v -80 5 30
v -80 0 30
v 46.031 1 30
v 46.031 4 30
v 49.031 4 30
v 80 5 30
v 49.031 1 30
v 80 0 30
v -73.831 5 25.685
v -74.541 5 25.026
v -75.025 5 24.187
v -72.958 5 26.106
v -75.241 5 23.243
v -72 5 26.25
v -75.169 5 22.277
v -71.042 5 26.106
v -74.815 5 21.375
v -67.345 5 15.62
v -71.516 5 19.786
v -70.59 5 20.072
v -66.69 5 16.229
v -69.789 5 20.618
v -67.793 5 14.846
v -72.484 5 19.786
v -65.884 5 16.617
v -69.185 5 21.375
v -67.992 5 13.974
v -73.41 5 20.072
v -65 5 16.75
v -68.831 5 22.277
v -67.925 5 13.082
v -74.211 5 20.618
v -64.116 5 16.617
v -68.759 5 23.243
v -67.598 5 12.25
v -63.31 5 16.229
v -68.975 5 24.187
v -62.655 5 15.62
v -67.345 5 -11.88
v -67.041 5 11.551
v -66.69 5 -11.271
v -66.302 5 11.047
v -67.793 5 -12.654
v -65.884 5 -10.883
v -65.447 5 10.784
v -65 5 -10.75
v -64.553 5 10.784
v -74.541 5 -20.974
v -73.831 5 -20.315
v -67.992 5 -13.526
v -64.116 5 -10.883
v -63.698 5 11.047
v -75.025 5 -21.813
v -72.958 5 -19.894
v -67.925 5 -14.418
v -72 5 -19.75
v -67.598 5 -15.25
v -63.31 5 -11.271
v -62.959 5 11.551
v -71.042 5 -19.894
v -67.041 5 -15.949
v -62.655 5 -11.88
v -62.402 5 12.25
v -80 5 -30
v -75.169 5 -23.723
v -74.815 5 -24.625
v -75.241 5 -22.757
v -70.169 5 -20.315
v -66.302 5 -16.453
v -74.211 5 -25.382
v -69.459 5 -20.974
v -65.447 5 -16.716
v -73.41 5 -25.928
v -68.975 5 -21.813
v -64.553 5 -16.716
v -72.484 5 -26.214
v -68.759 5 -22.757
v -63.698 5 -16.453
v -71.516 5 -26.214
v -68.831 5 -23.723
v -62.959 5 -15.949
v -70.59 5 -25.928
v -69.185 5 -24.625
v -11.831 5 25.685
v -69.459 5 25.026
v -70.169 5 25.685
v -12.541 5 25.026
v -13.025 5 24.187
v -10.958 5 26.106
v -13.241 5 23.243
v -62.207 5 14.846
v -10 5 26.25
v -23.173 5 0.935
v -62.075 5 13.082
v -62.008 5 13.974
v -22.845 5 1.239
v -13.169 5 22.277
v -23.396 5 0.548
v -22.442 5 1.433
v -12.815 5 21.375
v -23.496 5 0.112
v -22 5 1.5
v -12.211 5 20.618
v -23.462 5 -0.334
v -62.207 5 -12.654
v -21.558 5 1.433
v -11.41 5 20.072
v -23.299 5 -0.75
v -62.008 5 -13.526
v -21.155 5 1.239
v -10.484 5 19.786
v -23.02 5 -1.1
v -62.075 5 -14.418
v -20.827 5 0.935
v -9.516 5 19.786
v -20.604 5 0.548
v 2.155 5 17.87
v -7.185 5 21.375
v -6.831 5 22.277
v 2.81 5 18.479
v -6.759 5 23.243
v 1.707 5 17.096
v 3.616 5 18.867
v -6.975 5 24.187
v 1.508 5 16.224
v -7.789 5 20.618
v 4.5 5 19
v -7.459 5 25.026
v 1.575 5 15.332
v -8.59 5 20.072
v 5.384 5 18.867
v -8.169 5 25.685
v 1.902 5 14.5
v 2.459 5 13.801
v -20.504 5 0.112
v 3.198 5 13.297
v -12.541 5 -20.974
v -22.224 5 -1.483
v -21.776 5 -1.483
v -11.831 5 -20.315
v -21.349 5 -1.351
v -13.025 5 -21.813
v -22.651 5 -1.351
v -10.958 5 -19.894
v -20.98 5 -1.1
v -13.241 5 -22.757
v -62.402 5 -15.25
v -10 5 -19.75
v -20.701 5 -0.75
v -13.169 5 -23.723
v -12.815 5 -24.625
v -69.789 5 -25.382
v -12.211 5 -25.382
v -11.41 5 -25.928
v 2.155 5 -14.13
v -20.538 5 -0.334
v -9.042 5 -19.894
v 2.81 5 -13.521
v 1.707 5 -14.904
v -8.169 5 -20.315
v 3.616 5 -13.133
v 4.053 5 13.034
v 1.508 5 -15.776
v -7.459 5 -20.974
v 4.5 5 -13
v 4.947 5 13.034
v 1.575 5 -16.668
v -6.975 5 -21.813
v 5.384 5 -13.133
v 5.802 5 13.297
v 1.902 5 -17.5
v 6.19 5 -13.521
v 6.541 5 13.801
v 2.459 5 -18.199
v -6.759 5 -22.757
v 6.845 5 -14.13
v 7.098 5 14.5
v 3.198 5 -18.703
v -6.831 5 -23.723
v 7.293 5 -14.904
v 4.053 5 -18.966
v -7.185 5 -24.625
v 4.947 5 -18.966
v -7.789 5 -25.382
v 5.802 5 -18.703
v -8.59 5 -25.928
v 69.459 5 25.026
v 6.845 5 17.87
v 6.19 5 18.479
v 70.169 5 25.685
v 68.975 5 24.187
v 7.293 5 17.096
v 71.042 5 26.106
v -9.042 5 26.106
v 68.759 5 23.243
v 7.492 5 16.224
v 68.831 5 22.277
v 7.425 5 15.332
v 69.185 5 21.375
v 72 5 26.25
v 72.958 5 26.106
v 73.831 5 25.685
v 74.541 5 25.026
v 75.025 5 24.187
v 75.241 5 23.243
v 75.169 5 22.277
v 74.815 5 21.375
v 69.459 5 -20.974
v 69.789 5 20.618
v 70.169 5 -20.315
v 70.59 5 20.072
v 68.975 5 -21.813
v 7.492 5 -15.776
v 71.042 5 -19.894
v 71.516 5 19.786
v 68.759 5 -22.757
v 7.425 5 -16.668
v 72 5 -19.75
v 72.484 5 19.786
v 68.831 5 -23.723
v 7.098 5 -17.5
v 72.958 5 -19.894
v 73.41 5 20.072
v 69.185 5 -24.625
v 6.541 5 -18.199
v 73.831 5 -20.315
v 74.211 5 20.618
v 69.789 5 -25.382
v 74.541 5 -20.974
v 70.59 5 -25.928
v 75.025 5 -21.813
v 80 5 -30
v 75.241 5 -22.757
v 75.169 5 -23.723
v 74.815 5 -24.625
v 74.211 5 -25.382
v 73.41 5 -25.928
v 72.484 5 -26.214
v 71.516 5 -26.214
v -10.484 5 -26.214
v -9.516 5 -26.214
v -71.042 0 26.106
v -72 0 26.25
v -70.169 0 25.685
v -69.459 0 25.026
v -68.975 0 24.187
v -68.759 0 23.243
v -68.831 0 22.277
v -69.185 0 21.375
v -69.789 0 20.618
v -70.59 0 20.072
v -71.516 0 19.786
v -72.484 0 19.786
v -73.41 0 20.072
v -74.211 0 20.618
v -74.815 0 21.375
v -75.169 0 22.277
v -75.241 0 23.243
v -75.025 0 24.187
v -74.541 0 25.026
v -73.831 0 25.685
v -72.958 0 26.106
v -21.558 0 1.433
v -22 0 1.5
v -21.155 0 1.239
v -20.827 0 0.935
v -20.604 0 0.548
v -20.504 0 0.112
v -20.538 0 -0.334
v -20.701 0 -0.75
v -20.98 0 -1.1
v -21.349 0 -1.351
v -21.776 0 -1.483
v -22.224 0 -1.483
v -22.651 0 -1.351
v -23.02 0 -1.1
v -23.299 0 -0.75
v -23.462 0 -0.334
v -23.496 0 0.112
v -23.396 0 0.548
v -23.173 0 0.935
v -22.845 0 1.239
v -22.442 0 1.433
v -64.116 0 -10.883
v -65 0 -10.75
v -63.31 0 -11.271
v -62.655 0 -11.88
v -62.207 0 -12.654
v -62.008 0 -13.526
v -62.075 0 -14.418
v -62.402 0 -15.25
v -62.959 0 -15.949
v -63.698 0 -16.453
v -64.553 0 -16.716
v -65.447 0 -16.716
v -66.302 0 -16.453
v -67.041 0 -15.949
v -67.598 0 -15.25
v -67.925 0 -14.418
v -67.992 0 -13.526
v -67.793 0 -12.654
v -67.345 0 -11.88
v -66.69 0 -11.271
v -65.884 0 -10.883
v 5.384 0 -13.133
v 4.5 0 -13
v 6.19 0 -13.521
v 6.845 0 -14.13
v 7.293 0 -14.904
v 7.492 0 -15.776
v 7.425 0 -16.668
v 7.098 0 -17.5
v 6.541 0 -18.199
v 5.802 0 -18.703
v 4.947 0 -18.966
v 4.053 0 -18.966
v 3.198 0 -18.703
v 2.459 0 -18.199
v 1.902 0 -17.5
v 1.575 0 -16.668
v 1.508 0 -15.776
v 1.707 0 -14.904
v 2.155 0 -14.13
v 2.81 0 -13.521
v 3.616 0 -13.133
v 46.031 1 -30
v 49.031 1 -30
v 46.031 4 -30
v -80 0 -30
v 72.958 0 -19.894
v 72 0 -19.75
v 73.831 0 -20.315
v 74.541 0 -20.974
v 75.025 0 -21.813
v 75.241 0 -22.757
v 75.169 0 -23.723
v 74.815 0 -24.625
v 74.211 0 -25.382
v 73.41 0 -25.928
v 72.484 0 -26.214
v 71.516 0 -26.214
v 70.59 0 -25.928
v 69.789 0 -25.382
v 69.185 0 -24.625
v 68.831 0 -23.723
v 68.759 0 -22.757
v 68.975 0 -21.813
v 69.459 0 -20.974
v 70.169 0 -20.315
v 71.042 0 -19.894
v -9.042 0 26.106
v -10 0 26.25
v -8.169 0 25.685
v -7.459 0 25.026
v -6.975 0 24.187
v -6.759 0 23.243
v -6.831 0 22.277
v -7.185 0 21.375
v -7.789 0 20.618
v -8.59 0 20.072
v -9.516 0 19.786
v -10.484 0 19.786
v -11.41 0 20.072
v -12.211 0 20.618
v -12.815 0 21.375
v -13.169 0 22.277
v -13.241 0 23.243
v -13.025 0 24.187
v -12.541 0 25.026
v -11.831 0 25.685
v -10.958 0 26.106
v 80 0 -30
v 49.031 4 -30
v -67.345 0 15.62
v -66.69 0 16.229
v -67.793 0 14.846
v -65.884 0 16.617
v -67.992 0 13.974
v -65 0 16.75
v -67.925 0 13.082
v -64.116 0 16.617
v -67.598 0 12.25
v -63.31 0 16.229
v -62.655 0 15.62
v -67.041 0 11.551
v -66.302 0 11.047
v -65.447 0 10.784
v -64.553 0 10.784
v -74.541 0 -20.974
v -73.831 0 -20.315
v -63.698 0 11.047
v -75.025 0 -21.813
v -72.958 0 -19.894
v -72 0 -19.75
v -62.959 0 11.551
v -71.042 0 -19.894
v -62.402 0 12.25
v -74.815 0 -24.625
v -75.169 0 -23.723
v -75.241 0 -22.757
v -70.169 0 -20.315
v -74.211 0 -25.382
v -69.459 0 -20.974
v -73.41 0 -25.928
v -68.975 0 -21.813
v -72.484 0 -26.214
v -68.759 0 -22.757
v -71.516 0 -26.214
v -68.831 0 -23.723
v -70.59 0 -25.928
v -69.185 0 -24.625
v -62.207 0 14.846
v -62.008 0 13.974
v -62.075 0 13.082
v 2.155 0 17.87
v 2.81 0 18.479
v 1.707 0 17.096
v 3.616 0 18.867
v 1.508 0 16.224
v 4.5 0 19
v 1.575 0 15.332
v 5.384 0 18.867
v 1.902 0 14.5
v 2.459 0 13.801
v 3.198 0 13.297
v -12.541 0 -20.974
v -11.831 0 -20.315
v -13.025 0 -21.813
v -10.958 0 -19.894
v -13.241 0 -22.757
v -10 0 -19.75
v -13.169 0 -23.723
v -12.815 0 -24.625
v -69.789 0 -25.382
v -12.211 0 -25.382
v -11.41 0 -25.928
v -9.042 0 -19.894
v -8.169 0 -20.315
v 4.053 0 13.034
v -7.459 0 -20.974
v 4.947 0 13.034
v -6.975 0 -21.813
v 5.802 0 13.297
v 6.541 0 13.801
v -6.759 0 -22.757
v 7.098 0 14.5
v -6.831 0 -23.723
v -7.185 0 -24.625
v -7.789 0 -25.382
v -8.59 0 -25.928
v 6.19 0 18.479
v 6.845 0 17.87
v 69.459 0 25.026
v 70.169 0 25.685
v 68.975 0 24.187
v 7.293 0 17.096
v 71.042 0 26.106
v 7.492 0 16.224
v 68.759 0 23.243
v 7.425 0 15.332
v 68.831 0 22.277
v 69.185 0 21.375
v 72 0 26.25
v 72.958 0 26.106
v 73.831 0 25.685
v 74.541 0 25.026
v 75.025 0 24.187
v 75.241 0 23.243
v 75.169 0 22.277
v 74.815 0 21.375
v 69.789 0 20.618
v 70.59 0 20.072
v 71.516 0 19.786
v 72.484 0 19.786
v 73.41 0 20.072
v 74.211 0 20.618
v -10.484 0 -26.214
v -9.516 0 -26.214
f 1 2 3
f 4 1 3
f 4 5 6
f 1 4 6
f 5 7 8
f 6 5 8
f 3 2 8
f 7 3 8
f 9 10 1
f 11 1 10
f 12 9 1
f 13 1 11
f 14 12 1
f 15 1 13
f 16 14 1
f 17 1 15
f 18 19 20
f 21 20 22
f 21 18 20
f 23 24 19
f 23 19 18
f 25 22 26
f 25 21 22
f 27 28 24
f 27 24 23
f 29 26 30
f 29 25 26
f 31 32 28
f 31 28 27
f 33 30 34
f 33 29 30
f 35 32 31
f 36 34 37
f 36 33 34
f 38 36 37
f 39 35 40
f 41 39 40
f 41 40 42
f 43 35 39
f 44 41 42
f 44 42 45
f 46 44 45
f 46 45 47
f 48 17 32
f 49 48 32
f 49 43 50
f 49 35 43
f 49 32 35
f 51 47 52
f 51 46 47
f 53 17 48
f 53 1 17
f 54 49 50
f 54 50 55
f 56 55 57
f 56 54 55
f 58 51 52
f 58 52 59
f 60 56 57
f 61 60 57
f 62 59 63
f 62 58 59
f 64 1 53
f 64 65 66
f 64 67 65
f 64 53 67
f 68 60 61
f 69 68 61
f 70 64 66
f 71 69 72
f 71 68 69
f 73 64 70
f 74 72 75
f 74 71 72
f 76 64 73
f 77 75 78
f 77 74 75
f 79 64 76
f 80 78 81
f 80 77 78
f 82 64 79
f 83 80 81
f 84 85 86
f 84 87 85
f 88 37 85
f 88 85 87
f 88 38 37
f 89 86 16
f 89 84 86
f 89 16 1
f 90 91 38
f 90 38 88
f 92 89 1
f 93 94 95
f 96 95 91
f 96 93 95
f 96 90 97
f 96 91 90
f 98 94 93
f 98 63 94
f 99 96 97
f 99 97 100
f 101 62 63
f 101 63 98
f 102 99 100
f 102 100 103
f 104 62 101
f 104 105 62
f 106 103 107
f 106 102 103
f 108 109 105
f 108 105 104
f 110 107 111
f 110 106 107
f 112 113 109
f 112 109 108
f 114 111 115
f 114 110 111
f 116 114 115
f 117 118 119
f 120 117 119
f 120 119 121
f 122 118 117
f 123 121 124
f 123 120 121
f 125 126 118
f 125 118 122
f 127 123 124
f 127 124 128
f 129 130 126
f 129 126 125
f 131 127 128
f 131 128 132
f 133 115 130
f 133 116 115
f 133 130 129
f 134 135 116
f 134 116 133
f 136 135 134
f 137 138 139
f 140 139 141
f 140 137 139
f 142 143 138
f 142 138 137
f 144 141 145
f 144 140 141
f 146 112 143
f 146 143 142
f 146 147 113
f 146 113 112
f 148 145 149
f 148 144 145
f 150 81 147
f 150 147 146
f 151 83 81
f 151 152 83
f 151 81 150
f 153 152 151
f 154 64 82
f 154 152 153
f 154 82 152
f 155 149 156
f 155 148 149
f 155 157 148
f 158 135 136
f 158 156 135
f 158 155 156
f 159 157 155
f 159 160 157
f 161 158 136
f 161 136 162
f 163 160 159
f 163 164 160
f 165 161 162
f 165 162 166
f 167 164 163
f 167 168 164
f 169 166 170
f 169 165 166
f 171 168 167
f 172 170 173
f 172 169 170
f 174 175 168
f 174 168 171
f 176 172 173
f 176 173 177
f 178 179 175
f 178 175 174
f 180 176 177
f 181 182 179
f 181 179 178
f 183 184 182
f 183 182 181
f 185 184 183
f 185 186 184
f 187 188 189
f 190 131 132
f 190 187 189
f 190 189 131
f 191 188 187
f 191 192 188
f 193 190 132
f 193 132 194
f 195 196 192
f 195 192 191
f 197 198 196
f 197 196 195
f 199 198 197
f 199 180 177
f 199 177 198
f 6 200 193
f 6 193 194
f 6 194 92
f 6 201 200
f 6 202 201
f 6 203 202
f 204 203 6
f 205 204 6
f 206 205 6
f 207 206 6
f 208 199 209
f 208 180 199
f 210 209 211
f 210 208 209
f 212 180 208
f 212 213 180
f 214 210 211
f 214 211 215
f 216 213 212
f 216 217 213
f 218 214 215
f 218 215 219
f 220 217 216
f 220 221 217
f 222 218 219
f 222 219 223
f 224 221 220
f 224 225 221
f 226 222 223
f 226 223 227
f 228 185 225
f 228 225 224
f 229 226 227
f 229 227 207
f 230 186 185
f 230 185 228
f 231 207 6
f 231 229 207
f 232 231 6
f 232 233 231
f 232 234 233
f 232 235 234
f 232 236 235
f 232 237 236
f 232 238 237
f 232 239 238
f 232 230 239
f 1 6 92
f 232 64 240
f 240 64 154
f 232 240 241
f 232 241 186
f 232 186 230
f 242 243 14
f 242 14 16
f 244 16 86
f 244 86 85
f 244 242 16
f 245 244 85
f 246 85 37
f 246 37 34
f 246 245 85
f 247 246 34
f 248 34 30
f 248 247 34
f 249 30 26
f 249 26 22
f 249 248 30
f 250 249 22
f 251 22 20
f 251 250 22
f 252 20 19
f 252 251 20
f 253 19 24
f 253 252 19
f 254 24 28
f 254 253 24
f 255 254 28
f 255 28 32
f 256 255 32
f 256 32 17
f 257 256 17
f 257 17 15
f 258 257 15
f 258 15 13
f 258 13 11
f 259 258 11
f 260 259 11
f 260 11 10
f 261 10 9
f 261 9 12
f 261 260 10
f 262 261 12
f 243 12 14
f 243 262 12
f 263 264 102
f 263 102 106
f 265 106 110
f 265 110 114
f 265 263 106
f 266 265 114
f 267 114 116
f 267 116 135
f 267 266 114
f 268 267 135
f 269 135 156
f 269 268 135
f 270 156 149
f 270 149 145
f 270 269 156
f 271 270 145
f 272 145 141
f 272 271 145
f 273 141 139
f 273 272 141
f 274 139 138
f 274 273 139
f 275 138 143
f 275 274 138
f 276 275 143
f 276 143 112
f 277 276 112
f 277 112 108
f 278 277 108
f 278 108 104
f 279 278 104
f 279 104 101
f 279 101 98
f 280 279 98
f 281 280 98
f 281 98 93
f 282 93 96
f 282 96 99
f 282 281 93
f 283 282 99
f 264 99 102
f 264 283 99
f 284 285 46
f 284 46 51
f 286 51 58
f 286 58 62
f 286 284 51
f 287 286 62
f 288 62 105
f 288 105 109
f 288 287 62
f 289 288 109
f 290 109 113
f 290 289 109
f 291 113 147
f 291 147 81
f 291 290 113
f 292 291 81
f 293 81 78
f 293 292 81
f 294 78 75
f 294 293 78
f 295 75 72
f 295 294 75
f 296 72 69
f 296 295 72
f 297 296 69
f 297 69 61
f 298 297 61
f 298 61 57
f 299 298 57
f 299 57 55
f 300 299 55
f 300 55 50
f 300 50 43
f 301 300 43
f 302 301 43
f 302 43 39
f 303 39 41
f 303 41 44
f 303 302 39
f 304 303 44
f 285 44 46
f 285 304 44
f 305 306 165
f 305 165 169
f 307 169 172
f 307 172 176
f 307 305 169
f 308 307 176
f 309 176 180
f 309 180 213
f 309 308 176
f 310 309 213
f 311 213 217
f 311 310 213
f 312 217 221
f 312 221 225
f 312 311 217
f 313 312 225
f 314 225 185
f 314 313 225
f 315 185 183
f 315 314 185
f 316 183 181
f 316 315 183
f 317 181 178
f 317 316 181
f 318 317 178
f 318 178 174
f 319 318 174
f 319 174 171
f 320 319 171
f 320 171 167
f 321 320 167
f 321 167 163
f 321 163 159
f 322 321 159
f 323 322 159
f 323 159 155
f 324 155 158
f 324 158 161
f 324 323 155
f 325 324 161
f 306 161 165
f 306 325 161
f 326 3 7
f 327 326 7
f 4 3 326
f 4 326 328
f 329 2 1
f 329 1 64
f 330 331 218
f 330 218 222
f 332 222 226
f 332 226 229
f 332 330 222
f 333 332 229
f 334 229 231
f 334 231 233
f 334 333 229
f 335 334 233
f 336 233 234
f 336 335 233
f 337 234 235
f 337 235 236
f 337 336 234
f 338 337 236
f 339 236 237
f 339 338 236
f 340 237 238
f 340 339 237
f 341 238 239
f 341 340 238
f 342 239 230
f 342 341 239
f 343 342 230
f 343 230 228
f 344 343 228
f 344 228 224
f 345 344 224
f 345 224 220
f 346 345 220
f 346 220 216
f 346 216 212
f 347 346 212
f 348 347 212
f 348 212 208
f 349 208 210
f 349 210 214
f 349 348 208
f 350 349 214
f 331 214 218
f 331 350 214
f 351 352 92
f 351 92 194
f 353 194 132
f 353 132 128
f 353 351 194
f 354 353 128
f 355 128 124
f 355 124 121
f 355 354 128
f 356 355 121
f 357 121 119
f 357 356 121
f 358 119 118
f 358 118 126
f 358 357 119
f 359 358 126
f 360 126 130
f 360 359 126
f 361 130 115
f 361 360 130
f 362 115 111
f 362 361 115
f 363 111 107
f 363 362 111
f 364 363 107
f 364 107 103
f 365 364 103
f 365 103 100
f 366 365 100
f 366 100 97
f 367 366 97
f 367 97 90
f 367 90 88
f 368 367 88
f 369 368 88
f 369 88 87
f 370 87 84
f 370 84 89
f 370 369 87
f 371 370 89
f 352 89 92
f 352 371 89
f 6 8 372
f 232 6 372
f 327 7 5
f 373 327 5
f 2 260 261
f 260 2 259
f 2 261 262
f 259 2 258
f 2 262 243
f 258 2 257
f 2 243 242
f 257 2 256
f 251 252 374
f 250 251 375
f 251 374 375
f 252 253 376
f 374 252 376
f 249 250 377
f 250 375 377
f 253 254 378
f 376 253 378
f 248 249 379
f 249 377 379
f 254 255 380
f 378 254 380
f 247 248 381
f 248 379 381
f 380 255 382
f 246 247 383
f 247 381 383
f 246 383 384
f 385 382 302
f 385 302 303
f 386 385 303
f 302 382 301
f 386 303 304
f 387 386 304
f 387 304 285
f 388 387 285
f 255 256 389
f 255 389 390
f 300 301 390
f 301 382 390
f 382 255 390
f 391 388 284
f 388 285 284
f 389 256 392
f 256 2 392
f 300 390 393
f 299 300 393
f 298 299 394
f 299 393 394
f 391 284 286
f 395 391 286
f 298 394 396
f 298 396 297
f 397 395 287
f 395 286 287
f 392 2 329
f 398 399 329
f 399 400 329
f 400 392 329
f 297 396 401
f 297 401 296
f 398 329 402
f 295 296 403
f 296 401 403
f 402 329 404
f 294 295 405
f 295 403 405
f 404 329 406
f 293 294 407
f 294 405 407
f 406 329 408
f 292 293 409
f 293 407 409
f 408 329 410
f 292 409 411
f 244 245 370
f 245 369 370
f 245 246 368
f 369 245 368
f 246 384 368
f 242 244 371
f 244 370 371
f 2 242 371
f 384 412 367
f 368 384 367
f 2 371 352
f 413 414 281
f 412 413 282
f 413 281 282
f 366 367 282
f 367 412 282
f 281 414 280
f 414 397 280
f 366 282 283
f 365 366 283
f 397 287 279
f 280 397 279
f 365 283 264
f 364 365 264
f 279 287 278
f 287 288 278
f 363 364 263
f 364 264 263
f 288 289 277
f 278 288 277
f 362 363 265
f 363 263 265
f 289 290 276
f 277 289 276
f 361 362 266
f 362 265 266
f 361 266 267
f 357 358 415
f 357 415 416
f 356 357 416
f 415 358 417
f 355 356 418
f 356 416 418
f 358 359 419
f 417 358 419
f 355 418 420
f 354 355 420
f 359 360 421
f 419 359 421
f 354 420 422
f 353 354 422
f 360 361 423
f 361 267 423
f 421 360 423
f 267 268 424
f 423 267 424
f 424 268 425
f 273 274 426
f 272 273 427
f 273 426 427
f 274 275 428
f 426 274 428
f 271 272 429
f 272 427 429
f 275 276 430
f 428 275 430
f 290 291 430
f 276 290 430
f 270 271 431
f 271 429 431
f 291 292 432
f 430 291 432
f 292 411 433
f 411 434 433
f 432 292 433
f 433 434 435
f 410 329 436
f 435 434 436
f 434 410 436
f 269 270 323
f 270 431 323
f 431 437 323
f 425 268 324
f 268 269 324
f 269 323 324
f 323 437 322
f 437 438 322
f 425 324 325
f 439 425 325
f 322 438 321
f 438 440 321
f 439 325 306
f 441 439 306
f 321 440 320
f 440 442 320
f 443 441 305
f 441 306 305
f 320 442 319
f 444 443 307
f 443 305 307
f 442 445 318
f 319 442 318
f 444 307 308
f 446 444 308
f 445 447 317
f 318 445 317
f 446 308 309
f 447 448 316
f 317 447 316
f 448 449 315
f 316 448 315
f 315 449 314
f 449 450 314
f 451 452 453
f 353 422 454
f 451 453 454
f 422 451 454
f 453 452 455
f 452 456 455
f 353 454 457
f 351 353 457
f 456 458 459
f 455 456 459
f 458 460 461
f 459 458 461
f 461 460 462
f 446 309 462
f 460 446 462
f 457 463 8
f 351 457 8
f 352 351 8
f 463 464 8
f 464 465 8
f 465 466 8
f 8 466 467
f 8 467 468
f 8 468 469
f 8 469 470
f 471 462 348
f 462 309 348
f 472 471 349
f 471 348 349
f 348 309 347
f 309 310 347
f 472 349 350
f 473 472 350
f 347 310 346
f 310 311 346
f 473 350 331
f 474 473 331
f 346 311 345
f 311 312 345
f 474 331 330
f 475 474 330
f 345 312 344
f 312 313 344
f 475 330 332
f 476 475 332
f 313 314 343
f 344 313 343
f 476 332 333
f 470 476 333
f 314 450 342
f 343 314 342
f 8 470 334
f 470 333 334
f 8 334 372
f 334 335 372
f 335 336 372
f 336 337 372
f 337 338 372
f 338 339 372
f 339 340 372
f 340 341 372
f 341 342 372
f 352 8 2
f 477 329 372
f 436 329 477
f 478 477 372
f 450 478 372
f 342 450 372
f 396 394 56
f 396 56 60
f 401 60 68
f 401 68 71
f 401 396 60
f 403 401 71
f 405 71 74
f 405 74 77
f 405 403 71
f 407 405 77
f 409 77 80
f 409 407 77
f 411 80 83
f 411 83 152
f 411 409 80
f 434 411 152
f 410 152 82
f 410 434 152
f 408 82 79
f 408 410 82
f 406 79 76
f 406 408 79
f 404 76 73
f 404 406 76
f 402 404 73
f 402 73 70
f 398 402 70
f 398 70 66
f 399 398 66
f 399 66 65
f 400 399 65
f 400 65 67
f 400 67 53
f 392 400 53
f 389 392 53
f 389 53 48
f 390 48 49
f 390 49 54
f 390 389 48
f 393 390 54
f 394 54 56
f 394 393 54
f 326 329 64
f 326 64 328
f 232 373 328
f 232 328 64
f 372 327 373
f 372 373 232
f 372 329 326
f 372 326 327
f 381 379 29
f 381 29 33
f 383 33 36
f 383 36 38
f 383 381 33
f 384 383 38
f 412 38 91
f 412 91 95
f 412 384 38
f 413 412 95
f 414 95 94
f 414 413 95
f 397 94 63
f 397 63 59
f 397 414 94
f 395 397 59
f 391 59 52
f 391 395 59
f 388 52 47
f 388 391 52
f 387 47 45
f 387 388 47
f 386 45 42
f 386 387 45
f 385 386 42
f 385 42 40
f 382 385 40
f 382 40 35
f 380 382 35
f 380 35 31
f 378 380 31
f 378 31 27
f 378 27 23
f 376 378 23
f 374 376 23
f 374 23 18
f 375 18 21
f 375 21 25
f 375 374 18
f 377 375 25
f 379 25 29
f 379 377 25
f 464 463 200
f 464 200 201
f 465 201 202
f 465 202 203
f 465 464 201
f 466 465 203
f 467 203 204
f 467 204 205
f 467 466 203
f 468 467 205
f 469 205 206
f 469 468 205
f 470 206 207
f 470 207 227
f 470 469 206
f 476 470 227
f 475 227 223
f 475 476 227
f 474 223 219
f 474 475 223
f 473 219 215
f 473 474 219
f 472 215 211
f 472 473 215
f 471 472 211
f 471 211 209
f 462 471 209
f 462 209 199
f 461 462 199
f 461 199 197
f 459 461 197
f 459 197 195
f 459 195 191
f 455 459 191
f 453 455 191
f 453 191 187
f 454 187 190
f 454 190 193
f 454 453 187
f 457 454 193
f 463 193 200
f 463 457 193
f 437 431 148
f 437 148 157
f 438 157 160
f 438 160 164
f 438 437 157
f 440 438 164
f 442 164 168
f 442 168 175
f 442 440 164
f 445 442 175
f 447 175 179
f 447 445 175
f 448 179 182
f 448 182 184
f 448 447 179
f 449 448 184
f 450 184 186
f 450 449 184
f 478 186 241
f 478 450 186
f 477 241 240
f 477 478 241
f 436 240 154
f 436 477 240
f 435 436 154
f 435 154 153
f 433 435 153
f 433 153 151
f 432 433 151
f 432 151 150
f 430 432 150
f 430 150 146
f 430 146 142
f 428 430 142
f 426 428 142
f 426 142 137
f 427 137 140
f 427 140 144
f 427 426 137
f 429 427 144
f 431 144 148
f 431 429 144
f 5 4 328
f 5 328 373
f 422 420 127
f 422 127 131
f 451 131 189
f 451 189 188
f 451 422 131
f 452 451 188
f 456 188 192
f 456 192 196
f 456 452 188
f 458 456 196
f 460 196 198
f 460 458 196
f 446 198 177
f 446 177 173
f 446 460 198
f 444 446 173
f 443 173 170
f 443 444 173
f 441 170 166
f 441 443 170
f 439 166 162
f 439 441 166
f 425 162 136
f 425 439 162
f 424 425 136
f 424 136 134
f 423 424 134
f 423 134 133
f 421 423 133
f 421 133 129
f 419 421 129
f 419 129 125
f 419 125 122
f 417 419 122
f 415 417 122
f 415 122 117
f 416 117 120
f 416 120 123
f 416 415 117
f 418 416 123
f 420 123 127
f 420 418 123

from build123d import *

# Parameters (mm, degrees)
SKETCH1_W           = 160
SKETCH1_H           = 60
SKETCH1_R           = 3.25
SKETCH1_R_2         = 3
SKETCH1_R_3         = 1.5
BOSS_EXTRUDE1_DEPTH = 5
SKETCH2_W           = 3
SKETCH2_H           = 3
CUT_1EXTRUDE1_DEPTH = 65


with BuildPart() as part:
    # Sketch1 → Boss-Extrude1 (new body)
    with BuildSketch(Plane(origin=(0, 0, 0), x_dir=(1, 0, 0), z_dir=(0, 1, 0))):
        Rectangle(SKETCH1_W, SKETCH1_H)
        with Locations(Location((-72, 23, 0), (0, 0, 270))):
            Circle(SKETCH1_R, mode=Mode.SUBTRACT)
        with Locations(Location((-72, -23, 0), (0, 0, 270))):
            Circle(SKETCH1_R, mode=Mode.SUBTRACT)
        with Locations(Location((72, 23, 0), (0, 0, 270))):
            Circle(SKETCH1_R, mode=Mode.SUBTRACT)
        with Locations(Location((72, -23, 0), (0, 0, 270))):
            Circle(SKETCH1_R, mode=Mode.SUBTRACT)
        with Locations(Location((-10, 23, 0), (0, 0, 270))):
            Circle(SKETCH1_R, mode=Mode.SUBTRACT)
        with Locations(Location((-10, -23, 0), (0, 0, 270))):
            Circle(SKETCH1_R, mode=Mode.SUBTRACT)
        with Locations(Location((4.5, 16, 0), (0, 0, 270))):
            Circle(SKETCH1_R_2, mode=Mode.SUBTRACT)
        with Locations(Location((4.5, -16, 0), (0, 0, 270))):
            Circle(SKETCH1_R_2, mode=Mode.SUBTRACT)
        with Locations(Location((-65, 13.75, 0), (0, 0, 270))):
            Circle(SKETCH1_R_2, mode=Mode.SUBTRACT)
        with Locations(Location((-65, -13.75, 0), (0, 0, 270))):
            Circle(SKETCH1_R_2, mode=Mode.SUBTRACT)
        with Locations(Location((-22, 0, 0), (0, 0, 270))):
            Circle(SKETCH1_R_3, mode=Mode.SUBTRACT)
    extrude(amount=BOSS_EXTRUDE1_DEPTH)

    # Sketch2 → Cut-1Extrude1 (cut)
    with BuildSketch(Plane.XY.offset(30)):
        with Locations((47.530607127, 2.5)):
            Rectangle(SKETCH2_W, SKETCH2_H)
    extrude(amount=-CUT_1EXTRUDE1_DEPTH, mode=Mode.SUBTRACT)


solid = part.part
